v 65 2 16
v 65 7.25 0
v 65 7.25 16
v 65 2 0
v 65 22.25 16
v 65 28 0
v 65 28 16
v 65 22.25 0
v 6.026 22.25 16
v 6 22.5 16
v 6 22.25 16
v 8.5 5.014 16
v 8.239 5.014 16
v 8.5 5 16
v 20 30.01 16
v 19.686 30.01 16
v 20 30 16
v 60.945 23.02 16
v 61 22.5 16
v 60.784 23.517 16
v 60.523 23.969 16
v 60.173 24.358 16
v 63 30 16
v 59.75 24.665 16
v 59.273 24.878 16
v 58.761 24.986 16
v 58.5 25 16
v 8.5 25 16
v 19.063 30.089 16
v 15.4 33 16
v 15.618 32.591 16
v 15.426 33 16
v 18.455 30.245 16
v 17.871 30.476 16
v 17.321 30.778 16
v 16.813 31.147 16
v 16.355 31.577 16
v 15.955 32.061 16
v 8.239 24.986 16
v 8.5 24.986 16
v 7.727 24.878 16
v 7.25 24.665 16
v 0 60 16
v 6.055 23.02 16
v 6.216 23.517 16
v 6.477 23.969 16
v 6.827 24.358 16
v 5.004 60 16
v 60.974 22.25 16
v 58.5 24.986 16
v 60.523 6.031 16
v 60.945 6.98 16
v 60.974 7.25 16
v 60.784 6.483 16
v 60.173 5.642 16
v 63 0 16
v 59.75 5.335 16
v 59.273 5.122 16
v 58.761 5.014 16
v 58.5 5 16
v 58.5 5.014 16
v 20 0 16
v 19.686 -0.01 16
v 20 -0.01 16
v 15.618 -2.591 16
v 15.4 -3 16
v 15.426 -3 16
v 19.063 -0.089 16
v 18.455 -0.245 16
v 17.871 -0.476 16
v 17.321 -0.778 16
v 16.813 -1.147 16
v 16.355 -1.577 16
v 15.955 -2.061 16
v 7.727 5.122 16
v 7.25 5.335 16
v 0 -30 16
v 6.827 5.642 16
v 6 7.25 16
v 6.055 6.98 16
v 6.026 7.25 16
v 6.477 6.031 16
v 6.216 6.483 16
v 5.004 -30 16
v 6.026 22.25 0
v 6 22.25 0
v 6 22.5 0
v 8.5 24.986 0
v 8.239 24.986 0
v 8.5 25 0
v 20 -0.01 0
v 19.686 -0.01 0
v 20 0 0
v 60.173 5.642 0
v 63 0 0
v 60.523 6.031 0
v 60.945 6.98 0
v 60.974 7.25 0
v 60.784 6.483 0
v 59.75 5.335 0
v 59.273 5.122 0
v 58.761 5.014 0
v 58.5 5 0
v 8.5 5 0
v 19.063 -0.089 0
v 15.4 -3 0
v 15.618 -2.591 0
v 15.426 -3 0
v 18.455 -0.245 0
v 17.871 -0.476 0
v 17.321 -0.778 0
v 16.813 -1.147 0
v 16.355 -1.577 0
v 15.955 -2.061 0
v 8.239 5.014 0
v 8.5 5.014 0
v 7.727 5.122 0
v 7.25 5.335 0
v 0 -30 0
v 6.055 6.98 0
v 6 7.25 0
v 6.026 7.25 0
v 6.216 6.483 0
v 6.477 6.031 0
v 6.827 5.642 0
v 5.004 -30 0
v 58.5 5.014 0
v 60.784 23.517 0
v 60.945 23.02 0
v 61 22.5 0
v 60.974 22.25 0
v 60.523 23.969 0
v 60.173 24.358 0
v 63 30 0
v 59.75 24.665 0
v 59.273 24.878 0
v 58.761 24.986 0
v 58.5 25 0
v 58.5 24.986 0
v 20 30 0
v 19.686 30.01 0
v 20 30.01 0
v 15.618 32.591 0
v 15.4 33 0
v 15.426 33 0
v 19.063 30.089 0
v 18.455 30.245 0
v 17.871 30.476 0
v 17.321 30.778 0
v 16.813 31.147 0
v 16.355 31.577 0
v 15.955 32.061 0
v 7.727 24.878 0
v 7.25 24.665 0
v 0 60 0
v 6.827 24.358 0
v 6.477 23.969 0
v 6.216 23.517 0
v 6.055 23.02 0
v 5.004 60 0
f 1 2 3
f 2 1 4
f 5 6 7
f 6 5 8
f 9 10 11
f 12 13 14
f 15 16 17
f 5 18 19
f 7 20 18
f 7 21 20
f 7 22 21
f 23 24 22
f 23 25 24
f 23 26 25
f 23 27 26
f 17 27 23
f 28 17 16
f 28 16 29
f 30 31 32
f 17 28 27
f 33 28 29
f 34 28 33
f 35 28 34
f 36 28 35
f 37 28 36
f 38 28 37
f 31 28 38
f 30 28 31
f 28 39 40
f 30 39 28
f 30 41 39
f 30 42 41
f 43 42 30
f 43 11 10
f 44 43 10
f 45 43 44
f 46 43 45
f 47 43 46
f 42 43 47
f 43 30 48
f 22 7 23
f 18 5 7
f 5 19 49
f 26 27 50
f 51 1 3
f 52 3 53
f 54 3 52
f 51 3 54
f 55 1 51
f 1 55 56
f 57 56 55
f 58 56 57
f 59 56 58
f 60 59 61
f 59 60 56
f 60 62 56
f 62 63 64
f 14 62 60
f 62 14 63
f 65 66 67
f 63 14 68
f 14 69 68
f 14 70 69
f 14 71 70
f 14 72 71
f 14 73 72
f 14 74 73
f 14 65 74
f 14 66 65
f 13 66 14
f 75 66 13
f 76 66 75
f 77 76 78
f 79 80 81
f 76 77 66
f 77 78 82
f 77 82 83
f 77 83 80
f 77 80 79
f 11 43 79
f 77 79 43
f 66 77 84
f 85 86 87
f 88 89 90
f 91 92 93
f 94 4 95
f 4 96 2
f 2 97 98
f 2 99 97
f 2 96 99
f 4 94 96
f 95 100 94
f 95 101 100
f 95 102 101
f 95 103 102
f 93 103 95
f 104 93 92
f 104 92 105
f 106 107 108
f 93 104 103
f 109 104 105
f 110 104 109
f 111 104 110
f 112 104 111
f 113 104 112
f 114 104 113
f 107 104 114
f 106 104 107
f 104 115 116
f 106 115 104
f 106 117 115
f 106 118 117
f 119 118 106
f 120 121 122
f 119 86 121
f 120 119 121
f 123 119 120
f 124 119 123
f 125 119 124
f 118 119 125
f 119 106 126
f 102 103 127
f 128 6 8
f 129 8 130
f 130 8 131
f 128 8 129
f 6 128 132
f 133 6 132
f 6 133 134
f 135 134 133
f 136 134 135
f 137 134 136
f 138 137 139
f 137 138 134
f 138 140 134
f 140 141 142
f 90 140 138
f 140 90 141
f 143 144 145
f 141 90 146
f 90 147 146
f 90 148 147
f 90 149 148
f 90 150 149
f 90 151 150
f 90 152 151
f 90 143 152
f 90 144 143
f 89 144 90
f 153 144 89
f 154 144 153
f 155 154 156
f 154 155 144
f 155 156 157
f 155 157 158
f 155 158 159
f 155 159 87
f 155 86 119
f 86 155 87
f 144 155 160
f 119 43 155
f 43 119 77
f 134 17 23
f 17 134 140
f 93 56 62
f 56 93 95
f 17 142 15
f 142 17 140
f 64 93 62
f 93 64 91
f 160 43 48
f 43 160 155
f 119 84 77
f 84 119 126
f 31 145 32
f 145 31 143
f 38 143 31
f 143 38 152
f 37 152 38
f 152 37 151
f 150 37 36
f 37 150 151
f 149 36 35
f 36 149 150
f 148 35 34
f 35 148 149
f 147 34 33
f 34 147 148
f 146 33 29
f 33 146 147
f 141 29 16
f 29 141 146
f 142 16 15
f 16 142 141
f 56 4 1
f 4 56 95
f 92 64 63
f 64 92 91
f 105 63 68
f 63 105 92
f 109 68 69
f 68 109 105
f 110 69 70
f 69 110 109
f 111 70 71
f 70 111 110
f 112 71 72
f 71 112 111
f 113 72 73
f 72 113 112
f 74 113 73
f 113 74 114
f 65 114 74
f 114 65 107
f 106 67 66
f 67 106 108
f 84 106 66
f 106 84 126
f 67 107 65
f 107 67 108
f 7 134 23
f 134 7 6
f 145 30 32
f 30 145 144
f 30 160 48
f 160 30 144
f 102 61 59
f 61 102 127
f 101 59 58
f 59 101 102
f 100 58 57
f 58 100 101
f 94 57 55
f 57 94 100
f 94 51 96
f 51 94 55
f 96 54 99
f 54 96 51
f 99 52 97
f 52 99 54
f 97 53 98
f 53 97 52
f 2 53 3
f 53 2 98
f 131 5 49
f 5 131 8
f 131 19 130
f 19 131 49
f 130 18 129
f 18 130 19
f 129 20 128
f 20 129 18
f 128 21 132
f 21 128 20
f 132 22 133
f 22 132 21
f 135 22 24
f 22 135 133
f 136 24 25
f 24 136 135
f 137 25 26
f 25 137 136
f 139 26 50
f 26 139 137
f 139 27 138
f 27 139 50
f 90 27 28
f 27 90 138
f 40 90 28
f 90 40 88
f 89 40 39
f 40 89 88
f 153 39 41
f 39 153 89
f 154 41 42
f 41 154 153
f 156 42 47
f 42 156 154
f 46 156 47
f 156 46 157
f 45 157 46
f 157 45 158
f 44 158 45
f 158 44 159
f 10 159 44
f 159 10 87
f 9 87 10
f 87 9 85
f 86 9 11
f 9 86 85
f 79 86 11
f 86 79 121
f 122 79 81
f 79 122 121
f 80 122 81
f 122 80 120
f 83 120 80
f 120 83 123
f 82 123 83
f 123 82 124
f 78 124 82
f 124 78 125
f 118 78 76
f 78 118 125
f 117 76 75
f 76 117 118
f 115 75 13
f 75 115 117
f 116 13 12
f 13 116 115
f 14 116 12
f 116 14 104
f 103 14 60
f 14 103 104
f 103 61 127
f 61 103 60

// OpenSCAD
depth=16;
difference(){
  union(){
    cube([65,30,depth]);
    translate([0,-30]) cube([20,90,depth]);
  }
  translate([6,6,-.01]) linear_extrude(depth+.02) {
    translate([2.5,-1]) square([50,20]);
    for(x=[0,52.5])
      translate([x,1.25]) square([10,15]);
    for(x=[2.5,52.5],y=[1.5,16.5])
      translate([x,y]) circle(d=5,$fn=30);
  }
  translate([0,15]) for(m=[0,1]) mirror([0,m]) translate([0,-15])
  translate([0,0,-.01]) linear_extrude(depth+.02) {
    for(y=[-5,35]) translate([20,y]) circle(d=10,$fn=50);
    polygon([[5,-30.01],[15.4,-3],[60,-3],[66,3],[66,-35],[30,-35]]);
  }
}
